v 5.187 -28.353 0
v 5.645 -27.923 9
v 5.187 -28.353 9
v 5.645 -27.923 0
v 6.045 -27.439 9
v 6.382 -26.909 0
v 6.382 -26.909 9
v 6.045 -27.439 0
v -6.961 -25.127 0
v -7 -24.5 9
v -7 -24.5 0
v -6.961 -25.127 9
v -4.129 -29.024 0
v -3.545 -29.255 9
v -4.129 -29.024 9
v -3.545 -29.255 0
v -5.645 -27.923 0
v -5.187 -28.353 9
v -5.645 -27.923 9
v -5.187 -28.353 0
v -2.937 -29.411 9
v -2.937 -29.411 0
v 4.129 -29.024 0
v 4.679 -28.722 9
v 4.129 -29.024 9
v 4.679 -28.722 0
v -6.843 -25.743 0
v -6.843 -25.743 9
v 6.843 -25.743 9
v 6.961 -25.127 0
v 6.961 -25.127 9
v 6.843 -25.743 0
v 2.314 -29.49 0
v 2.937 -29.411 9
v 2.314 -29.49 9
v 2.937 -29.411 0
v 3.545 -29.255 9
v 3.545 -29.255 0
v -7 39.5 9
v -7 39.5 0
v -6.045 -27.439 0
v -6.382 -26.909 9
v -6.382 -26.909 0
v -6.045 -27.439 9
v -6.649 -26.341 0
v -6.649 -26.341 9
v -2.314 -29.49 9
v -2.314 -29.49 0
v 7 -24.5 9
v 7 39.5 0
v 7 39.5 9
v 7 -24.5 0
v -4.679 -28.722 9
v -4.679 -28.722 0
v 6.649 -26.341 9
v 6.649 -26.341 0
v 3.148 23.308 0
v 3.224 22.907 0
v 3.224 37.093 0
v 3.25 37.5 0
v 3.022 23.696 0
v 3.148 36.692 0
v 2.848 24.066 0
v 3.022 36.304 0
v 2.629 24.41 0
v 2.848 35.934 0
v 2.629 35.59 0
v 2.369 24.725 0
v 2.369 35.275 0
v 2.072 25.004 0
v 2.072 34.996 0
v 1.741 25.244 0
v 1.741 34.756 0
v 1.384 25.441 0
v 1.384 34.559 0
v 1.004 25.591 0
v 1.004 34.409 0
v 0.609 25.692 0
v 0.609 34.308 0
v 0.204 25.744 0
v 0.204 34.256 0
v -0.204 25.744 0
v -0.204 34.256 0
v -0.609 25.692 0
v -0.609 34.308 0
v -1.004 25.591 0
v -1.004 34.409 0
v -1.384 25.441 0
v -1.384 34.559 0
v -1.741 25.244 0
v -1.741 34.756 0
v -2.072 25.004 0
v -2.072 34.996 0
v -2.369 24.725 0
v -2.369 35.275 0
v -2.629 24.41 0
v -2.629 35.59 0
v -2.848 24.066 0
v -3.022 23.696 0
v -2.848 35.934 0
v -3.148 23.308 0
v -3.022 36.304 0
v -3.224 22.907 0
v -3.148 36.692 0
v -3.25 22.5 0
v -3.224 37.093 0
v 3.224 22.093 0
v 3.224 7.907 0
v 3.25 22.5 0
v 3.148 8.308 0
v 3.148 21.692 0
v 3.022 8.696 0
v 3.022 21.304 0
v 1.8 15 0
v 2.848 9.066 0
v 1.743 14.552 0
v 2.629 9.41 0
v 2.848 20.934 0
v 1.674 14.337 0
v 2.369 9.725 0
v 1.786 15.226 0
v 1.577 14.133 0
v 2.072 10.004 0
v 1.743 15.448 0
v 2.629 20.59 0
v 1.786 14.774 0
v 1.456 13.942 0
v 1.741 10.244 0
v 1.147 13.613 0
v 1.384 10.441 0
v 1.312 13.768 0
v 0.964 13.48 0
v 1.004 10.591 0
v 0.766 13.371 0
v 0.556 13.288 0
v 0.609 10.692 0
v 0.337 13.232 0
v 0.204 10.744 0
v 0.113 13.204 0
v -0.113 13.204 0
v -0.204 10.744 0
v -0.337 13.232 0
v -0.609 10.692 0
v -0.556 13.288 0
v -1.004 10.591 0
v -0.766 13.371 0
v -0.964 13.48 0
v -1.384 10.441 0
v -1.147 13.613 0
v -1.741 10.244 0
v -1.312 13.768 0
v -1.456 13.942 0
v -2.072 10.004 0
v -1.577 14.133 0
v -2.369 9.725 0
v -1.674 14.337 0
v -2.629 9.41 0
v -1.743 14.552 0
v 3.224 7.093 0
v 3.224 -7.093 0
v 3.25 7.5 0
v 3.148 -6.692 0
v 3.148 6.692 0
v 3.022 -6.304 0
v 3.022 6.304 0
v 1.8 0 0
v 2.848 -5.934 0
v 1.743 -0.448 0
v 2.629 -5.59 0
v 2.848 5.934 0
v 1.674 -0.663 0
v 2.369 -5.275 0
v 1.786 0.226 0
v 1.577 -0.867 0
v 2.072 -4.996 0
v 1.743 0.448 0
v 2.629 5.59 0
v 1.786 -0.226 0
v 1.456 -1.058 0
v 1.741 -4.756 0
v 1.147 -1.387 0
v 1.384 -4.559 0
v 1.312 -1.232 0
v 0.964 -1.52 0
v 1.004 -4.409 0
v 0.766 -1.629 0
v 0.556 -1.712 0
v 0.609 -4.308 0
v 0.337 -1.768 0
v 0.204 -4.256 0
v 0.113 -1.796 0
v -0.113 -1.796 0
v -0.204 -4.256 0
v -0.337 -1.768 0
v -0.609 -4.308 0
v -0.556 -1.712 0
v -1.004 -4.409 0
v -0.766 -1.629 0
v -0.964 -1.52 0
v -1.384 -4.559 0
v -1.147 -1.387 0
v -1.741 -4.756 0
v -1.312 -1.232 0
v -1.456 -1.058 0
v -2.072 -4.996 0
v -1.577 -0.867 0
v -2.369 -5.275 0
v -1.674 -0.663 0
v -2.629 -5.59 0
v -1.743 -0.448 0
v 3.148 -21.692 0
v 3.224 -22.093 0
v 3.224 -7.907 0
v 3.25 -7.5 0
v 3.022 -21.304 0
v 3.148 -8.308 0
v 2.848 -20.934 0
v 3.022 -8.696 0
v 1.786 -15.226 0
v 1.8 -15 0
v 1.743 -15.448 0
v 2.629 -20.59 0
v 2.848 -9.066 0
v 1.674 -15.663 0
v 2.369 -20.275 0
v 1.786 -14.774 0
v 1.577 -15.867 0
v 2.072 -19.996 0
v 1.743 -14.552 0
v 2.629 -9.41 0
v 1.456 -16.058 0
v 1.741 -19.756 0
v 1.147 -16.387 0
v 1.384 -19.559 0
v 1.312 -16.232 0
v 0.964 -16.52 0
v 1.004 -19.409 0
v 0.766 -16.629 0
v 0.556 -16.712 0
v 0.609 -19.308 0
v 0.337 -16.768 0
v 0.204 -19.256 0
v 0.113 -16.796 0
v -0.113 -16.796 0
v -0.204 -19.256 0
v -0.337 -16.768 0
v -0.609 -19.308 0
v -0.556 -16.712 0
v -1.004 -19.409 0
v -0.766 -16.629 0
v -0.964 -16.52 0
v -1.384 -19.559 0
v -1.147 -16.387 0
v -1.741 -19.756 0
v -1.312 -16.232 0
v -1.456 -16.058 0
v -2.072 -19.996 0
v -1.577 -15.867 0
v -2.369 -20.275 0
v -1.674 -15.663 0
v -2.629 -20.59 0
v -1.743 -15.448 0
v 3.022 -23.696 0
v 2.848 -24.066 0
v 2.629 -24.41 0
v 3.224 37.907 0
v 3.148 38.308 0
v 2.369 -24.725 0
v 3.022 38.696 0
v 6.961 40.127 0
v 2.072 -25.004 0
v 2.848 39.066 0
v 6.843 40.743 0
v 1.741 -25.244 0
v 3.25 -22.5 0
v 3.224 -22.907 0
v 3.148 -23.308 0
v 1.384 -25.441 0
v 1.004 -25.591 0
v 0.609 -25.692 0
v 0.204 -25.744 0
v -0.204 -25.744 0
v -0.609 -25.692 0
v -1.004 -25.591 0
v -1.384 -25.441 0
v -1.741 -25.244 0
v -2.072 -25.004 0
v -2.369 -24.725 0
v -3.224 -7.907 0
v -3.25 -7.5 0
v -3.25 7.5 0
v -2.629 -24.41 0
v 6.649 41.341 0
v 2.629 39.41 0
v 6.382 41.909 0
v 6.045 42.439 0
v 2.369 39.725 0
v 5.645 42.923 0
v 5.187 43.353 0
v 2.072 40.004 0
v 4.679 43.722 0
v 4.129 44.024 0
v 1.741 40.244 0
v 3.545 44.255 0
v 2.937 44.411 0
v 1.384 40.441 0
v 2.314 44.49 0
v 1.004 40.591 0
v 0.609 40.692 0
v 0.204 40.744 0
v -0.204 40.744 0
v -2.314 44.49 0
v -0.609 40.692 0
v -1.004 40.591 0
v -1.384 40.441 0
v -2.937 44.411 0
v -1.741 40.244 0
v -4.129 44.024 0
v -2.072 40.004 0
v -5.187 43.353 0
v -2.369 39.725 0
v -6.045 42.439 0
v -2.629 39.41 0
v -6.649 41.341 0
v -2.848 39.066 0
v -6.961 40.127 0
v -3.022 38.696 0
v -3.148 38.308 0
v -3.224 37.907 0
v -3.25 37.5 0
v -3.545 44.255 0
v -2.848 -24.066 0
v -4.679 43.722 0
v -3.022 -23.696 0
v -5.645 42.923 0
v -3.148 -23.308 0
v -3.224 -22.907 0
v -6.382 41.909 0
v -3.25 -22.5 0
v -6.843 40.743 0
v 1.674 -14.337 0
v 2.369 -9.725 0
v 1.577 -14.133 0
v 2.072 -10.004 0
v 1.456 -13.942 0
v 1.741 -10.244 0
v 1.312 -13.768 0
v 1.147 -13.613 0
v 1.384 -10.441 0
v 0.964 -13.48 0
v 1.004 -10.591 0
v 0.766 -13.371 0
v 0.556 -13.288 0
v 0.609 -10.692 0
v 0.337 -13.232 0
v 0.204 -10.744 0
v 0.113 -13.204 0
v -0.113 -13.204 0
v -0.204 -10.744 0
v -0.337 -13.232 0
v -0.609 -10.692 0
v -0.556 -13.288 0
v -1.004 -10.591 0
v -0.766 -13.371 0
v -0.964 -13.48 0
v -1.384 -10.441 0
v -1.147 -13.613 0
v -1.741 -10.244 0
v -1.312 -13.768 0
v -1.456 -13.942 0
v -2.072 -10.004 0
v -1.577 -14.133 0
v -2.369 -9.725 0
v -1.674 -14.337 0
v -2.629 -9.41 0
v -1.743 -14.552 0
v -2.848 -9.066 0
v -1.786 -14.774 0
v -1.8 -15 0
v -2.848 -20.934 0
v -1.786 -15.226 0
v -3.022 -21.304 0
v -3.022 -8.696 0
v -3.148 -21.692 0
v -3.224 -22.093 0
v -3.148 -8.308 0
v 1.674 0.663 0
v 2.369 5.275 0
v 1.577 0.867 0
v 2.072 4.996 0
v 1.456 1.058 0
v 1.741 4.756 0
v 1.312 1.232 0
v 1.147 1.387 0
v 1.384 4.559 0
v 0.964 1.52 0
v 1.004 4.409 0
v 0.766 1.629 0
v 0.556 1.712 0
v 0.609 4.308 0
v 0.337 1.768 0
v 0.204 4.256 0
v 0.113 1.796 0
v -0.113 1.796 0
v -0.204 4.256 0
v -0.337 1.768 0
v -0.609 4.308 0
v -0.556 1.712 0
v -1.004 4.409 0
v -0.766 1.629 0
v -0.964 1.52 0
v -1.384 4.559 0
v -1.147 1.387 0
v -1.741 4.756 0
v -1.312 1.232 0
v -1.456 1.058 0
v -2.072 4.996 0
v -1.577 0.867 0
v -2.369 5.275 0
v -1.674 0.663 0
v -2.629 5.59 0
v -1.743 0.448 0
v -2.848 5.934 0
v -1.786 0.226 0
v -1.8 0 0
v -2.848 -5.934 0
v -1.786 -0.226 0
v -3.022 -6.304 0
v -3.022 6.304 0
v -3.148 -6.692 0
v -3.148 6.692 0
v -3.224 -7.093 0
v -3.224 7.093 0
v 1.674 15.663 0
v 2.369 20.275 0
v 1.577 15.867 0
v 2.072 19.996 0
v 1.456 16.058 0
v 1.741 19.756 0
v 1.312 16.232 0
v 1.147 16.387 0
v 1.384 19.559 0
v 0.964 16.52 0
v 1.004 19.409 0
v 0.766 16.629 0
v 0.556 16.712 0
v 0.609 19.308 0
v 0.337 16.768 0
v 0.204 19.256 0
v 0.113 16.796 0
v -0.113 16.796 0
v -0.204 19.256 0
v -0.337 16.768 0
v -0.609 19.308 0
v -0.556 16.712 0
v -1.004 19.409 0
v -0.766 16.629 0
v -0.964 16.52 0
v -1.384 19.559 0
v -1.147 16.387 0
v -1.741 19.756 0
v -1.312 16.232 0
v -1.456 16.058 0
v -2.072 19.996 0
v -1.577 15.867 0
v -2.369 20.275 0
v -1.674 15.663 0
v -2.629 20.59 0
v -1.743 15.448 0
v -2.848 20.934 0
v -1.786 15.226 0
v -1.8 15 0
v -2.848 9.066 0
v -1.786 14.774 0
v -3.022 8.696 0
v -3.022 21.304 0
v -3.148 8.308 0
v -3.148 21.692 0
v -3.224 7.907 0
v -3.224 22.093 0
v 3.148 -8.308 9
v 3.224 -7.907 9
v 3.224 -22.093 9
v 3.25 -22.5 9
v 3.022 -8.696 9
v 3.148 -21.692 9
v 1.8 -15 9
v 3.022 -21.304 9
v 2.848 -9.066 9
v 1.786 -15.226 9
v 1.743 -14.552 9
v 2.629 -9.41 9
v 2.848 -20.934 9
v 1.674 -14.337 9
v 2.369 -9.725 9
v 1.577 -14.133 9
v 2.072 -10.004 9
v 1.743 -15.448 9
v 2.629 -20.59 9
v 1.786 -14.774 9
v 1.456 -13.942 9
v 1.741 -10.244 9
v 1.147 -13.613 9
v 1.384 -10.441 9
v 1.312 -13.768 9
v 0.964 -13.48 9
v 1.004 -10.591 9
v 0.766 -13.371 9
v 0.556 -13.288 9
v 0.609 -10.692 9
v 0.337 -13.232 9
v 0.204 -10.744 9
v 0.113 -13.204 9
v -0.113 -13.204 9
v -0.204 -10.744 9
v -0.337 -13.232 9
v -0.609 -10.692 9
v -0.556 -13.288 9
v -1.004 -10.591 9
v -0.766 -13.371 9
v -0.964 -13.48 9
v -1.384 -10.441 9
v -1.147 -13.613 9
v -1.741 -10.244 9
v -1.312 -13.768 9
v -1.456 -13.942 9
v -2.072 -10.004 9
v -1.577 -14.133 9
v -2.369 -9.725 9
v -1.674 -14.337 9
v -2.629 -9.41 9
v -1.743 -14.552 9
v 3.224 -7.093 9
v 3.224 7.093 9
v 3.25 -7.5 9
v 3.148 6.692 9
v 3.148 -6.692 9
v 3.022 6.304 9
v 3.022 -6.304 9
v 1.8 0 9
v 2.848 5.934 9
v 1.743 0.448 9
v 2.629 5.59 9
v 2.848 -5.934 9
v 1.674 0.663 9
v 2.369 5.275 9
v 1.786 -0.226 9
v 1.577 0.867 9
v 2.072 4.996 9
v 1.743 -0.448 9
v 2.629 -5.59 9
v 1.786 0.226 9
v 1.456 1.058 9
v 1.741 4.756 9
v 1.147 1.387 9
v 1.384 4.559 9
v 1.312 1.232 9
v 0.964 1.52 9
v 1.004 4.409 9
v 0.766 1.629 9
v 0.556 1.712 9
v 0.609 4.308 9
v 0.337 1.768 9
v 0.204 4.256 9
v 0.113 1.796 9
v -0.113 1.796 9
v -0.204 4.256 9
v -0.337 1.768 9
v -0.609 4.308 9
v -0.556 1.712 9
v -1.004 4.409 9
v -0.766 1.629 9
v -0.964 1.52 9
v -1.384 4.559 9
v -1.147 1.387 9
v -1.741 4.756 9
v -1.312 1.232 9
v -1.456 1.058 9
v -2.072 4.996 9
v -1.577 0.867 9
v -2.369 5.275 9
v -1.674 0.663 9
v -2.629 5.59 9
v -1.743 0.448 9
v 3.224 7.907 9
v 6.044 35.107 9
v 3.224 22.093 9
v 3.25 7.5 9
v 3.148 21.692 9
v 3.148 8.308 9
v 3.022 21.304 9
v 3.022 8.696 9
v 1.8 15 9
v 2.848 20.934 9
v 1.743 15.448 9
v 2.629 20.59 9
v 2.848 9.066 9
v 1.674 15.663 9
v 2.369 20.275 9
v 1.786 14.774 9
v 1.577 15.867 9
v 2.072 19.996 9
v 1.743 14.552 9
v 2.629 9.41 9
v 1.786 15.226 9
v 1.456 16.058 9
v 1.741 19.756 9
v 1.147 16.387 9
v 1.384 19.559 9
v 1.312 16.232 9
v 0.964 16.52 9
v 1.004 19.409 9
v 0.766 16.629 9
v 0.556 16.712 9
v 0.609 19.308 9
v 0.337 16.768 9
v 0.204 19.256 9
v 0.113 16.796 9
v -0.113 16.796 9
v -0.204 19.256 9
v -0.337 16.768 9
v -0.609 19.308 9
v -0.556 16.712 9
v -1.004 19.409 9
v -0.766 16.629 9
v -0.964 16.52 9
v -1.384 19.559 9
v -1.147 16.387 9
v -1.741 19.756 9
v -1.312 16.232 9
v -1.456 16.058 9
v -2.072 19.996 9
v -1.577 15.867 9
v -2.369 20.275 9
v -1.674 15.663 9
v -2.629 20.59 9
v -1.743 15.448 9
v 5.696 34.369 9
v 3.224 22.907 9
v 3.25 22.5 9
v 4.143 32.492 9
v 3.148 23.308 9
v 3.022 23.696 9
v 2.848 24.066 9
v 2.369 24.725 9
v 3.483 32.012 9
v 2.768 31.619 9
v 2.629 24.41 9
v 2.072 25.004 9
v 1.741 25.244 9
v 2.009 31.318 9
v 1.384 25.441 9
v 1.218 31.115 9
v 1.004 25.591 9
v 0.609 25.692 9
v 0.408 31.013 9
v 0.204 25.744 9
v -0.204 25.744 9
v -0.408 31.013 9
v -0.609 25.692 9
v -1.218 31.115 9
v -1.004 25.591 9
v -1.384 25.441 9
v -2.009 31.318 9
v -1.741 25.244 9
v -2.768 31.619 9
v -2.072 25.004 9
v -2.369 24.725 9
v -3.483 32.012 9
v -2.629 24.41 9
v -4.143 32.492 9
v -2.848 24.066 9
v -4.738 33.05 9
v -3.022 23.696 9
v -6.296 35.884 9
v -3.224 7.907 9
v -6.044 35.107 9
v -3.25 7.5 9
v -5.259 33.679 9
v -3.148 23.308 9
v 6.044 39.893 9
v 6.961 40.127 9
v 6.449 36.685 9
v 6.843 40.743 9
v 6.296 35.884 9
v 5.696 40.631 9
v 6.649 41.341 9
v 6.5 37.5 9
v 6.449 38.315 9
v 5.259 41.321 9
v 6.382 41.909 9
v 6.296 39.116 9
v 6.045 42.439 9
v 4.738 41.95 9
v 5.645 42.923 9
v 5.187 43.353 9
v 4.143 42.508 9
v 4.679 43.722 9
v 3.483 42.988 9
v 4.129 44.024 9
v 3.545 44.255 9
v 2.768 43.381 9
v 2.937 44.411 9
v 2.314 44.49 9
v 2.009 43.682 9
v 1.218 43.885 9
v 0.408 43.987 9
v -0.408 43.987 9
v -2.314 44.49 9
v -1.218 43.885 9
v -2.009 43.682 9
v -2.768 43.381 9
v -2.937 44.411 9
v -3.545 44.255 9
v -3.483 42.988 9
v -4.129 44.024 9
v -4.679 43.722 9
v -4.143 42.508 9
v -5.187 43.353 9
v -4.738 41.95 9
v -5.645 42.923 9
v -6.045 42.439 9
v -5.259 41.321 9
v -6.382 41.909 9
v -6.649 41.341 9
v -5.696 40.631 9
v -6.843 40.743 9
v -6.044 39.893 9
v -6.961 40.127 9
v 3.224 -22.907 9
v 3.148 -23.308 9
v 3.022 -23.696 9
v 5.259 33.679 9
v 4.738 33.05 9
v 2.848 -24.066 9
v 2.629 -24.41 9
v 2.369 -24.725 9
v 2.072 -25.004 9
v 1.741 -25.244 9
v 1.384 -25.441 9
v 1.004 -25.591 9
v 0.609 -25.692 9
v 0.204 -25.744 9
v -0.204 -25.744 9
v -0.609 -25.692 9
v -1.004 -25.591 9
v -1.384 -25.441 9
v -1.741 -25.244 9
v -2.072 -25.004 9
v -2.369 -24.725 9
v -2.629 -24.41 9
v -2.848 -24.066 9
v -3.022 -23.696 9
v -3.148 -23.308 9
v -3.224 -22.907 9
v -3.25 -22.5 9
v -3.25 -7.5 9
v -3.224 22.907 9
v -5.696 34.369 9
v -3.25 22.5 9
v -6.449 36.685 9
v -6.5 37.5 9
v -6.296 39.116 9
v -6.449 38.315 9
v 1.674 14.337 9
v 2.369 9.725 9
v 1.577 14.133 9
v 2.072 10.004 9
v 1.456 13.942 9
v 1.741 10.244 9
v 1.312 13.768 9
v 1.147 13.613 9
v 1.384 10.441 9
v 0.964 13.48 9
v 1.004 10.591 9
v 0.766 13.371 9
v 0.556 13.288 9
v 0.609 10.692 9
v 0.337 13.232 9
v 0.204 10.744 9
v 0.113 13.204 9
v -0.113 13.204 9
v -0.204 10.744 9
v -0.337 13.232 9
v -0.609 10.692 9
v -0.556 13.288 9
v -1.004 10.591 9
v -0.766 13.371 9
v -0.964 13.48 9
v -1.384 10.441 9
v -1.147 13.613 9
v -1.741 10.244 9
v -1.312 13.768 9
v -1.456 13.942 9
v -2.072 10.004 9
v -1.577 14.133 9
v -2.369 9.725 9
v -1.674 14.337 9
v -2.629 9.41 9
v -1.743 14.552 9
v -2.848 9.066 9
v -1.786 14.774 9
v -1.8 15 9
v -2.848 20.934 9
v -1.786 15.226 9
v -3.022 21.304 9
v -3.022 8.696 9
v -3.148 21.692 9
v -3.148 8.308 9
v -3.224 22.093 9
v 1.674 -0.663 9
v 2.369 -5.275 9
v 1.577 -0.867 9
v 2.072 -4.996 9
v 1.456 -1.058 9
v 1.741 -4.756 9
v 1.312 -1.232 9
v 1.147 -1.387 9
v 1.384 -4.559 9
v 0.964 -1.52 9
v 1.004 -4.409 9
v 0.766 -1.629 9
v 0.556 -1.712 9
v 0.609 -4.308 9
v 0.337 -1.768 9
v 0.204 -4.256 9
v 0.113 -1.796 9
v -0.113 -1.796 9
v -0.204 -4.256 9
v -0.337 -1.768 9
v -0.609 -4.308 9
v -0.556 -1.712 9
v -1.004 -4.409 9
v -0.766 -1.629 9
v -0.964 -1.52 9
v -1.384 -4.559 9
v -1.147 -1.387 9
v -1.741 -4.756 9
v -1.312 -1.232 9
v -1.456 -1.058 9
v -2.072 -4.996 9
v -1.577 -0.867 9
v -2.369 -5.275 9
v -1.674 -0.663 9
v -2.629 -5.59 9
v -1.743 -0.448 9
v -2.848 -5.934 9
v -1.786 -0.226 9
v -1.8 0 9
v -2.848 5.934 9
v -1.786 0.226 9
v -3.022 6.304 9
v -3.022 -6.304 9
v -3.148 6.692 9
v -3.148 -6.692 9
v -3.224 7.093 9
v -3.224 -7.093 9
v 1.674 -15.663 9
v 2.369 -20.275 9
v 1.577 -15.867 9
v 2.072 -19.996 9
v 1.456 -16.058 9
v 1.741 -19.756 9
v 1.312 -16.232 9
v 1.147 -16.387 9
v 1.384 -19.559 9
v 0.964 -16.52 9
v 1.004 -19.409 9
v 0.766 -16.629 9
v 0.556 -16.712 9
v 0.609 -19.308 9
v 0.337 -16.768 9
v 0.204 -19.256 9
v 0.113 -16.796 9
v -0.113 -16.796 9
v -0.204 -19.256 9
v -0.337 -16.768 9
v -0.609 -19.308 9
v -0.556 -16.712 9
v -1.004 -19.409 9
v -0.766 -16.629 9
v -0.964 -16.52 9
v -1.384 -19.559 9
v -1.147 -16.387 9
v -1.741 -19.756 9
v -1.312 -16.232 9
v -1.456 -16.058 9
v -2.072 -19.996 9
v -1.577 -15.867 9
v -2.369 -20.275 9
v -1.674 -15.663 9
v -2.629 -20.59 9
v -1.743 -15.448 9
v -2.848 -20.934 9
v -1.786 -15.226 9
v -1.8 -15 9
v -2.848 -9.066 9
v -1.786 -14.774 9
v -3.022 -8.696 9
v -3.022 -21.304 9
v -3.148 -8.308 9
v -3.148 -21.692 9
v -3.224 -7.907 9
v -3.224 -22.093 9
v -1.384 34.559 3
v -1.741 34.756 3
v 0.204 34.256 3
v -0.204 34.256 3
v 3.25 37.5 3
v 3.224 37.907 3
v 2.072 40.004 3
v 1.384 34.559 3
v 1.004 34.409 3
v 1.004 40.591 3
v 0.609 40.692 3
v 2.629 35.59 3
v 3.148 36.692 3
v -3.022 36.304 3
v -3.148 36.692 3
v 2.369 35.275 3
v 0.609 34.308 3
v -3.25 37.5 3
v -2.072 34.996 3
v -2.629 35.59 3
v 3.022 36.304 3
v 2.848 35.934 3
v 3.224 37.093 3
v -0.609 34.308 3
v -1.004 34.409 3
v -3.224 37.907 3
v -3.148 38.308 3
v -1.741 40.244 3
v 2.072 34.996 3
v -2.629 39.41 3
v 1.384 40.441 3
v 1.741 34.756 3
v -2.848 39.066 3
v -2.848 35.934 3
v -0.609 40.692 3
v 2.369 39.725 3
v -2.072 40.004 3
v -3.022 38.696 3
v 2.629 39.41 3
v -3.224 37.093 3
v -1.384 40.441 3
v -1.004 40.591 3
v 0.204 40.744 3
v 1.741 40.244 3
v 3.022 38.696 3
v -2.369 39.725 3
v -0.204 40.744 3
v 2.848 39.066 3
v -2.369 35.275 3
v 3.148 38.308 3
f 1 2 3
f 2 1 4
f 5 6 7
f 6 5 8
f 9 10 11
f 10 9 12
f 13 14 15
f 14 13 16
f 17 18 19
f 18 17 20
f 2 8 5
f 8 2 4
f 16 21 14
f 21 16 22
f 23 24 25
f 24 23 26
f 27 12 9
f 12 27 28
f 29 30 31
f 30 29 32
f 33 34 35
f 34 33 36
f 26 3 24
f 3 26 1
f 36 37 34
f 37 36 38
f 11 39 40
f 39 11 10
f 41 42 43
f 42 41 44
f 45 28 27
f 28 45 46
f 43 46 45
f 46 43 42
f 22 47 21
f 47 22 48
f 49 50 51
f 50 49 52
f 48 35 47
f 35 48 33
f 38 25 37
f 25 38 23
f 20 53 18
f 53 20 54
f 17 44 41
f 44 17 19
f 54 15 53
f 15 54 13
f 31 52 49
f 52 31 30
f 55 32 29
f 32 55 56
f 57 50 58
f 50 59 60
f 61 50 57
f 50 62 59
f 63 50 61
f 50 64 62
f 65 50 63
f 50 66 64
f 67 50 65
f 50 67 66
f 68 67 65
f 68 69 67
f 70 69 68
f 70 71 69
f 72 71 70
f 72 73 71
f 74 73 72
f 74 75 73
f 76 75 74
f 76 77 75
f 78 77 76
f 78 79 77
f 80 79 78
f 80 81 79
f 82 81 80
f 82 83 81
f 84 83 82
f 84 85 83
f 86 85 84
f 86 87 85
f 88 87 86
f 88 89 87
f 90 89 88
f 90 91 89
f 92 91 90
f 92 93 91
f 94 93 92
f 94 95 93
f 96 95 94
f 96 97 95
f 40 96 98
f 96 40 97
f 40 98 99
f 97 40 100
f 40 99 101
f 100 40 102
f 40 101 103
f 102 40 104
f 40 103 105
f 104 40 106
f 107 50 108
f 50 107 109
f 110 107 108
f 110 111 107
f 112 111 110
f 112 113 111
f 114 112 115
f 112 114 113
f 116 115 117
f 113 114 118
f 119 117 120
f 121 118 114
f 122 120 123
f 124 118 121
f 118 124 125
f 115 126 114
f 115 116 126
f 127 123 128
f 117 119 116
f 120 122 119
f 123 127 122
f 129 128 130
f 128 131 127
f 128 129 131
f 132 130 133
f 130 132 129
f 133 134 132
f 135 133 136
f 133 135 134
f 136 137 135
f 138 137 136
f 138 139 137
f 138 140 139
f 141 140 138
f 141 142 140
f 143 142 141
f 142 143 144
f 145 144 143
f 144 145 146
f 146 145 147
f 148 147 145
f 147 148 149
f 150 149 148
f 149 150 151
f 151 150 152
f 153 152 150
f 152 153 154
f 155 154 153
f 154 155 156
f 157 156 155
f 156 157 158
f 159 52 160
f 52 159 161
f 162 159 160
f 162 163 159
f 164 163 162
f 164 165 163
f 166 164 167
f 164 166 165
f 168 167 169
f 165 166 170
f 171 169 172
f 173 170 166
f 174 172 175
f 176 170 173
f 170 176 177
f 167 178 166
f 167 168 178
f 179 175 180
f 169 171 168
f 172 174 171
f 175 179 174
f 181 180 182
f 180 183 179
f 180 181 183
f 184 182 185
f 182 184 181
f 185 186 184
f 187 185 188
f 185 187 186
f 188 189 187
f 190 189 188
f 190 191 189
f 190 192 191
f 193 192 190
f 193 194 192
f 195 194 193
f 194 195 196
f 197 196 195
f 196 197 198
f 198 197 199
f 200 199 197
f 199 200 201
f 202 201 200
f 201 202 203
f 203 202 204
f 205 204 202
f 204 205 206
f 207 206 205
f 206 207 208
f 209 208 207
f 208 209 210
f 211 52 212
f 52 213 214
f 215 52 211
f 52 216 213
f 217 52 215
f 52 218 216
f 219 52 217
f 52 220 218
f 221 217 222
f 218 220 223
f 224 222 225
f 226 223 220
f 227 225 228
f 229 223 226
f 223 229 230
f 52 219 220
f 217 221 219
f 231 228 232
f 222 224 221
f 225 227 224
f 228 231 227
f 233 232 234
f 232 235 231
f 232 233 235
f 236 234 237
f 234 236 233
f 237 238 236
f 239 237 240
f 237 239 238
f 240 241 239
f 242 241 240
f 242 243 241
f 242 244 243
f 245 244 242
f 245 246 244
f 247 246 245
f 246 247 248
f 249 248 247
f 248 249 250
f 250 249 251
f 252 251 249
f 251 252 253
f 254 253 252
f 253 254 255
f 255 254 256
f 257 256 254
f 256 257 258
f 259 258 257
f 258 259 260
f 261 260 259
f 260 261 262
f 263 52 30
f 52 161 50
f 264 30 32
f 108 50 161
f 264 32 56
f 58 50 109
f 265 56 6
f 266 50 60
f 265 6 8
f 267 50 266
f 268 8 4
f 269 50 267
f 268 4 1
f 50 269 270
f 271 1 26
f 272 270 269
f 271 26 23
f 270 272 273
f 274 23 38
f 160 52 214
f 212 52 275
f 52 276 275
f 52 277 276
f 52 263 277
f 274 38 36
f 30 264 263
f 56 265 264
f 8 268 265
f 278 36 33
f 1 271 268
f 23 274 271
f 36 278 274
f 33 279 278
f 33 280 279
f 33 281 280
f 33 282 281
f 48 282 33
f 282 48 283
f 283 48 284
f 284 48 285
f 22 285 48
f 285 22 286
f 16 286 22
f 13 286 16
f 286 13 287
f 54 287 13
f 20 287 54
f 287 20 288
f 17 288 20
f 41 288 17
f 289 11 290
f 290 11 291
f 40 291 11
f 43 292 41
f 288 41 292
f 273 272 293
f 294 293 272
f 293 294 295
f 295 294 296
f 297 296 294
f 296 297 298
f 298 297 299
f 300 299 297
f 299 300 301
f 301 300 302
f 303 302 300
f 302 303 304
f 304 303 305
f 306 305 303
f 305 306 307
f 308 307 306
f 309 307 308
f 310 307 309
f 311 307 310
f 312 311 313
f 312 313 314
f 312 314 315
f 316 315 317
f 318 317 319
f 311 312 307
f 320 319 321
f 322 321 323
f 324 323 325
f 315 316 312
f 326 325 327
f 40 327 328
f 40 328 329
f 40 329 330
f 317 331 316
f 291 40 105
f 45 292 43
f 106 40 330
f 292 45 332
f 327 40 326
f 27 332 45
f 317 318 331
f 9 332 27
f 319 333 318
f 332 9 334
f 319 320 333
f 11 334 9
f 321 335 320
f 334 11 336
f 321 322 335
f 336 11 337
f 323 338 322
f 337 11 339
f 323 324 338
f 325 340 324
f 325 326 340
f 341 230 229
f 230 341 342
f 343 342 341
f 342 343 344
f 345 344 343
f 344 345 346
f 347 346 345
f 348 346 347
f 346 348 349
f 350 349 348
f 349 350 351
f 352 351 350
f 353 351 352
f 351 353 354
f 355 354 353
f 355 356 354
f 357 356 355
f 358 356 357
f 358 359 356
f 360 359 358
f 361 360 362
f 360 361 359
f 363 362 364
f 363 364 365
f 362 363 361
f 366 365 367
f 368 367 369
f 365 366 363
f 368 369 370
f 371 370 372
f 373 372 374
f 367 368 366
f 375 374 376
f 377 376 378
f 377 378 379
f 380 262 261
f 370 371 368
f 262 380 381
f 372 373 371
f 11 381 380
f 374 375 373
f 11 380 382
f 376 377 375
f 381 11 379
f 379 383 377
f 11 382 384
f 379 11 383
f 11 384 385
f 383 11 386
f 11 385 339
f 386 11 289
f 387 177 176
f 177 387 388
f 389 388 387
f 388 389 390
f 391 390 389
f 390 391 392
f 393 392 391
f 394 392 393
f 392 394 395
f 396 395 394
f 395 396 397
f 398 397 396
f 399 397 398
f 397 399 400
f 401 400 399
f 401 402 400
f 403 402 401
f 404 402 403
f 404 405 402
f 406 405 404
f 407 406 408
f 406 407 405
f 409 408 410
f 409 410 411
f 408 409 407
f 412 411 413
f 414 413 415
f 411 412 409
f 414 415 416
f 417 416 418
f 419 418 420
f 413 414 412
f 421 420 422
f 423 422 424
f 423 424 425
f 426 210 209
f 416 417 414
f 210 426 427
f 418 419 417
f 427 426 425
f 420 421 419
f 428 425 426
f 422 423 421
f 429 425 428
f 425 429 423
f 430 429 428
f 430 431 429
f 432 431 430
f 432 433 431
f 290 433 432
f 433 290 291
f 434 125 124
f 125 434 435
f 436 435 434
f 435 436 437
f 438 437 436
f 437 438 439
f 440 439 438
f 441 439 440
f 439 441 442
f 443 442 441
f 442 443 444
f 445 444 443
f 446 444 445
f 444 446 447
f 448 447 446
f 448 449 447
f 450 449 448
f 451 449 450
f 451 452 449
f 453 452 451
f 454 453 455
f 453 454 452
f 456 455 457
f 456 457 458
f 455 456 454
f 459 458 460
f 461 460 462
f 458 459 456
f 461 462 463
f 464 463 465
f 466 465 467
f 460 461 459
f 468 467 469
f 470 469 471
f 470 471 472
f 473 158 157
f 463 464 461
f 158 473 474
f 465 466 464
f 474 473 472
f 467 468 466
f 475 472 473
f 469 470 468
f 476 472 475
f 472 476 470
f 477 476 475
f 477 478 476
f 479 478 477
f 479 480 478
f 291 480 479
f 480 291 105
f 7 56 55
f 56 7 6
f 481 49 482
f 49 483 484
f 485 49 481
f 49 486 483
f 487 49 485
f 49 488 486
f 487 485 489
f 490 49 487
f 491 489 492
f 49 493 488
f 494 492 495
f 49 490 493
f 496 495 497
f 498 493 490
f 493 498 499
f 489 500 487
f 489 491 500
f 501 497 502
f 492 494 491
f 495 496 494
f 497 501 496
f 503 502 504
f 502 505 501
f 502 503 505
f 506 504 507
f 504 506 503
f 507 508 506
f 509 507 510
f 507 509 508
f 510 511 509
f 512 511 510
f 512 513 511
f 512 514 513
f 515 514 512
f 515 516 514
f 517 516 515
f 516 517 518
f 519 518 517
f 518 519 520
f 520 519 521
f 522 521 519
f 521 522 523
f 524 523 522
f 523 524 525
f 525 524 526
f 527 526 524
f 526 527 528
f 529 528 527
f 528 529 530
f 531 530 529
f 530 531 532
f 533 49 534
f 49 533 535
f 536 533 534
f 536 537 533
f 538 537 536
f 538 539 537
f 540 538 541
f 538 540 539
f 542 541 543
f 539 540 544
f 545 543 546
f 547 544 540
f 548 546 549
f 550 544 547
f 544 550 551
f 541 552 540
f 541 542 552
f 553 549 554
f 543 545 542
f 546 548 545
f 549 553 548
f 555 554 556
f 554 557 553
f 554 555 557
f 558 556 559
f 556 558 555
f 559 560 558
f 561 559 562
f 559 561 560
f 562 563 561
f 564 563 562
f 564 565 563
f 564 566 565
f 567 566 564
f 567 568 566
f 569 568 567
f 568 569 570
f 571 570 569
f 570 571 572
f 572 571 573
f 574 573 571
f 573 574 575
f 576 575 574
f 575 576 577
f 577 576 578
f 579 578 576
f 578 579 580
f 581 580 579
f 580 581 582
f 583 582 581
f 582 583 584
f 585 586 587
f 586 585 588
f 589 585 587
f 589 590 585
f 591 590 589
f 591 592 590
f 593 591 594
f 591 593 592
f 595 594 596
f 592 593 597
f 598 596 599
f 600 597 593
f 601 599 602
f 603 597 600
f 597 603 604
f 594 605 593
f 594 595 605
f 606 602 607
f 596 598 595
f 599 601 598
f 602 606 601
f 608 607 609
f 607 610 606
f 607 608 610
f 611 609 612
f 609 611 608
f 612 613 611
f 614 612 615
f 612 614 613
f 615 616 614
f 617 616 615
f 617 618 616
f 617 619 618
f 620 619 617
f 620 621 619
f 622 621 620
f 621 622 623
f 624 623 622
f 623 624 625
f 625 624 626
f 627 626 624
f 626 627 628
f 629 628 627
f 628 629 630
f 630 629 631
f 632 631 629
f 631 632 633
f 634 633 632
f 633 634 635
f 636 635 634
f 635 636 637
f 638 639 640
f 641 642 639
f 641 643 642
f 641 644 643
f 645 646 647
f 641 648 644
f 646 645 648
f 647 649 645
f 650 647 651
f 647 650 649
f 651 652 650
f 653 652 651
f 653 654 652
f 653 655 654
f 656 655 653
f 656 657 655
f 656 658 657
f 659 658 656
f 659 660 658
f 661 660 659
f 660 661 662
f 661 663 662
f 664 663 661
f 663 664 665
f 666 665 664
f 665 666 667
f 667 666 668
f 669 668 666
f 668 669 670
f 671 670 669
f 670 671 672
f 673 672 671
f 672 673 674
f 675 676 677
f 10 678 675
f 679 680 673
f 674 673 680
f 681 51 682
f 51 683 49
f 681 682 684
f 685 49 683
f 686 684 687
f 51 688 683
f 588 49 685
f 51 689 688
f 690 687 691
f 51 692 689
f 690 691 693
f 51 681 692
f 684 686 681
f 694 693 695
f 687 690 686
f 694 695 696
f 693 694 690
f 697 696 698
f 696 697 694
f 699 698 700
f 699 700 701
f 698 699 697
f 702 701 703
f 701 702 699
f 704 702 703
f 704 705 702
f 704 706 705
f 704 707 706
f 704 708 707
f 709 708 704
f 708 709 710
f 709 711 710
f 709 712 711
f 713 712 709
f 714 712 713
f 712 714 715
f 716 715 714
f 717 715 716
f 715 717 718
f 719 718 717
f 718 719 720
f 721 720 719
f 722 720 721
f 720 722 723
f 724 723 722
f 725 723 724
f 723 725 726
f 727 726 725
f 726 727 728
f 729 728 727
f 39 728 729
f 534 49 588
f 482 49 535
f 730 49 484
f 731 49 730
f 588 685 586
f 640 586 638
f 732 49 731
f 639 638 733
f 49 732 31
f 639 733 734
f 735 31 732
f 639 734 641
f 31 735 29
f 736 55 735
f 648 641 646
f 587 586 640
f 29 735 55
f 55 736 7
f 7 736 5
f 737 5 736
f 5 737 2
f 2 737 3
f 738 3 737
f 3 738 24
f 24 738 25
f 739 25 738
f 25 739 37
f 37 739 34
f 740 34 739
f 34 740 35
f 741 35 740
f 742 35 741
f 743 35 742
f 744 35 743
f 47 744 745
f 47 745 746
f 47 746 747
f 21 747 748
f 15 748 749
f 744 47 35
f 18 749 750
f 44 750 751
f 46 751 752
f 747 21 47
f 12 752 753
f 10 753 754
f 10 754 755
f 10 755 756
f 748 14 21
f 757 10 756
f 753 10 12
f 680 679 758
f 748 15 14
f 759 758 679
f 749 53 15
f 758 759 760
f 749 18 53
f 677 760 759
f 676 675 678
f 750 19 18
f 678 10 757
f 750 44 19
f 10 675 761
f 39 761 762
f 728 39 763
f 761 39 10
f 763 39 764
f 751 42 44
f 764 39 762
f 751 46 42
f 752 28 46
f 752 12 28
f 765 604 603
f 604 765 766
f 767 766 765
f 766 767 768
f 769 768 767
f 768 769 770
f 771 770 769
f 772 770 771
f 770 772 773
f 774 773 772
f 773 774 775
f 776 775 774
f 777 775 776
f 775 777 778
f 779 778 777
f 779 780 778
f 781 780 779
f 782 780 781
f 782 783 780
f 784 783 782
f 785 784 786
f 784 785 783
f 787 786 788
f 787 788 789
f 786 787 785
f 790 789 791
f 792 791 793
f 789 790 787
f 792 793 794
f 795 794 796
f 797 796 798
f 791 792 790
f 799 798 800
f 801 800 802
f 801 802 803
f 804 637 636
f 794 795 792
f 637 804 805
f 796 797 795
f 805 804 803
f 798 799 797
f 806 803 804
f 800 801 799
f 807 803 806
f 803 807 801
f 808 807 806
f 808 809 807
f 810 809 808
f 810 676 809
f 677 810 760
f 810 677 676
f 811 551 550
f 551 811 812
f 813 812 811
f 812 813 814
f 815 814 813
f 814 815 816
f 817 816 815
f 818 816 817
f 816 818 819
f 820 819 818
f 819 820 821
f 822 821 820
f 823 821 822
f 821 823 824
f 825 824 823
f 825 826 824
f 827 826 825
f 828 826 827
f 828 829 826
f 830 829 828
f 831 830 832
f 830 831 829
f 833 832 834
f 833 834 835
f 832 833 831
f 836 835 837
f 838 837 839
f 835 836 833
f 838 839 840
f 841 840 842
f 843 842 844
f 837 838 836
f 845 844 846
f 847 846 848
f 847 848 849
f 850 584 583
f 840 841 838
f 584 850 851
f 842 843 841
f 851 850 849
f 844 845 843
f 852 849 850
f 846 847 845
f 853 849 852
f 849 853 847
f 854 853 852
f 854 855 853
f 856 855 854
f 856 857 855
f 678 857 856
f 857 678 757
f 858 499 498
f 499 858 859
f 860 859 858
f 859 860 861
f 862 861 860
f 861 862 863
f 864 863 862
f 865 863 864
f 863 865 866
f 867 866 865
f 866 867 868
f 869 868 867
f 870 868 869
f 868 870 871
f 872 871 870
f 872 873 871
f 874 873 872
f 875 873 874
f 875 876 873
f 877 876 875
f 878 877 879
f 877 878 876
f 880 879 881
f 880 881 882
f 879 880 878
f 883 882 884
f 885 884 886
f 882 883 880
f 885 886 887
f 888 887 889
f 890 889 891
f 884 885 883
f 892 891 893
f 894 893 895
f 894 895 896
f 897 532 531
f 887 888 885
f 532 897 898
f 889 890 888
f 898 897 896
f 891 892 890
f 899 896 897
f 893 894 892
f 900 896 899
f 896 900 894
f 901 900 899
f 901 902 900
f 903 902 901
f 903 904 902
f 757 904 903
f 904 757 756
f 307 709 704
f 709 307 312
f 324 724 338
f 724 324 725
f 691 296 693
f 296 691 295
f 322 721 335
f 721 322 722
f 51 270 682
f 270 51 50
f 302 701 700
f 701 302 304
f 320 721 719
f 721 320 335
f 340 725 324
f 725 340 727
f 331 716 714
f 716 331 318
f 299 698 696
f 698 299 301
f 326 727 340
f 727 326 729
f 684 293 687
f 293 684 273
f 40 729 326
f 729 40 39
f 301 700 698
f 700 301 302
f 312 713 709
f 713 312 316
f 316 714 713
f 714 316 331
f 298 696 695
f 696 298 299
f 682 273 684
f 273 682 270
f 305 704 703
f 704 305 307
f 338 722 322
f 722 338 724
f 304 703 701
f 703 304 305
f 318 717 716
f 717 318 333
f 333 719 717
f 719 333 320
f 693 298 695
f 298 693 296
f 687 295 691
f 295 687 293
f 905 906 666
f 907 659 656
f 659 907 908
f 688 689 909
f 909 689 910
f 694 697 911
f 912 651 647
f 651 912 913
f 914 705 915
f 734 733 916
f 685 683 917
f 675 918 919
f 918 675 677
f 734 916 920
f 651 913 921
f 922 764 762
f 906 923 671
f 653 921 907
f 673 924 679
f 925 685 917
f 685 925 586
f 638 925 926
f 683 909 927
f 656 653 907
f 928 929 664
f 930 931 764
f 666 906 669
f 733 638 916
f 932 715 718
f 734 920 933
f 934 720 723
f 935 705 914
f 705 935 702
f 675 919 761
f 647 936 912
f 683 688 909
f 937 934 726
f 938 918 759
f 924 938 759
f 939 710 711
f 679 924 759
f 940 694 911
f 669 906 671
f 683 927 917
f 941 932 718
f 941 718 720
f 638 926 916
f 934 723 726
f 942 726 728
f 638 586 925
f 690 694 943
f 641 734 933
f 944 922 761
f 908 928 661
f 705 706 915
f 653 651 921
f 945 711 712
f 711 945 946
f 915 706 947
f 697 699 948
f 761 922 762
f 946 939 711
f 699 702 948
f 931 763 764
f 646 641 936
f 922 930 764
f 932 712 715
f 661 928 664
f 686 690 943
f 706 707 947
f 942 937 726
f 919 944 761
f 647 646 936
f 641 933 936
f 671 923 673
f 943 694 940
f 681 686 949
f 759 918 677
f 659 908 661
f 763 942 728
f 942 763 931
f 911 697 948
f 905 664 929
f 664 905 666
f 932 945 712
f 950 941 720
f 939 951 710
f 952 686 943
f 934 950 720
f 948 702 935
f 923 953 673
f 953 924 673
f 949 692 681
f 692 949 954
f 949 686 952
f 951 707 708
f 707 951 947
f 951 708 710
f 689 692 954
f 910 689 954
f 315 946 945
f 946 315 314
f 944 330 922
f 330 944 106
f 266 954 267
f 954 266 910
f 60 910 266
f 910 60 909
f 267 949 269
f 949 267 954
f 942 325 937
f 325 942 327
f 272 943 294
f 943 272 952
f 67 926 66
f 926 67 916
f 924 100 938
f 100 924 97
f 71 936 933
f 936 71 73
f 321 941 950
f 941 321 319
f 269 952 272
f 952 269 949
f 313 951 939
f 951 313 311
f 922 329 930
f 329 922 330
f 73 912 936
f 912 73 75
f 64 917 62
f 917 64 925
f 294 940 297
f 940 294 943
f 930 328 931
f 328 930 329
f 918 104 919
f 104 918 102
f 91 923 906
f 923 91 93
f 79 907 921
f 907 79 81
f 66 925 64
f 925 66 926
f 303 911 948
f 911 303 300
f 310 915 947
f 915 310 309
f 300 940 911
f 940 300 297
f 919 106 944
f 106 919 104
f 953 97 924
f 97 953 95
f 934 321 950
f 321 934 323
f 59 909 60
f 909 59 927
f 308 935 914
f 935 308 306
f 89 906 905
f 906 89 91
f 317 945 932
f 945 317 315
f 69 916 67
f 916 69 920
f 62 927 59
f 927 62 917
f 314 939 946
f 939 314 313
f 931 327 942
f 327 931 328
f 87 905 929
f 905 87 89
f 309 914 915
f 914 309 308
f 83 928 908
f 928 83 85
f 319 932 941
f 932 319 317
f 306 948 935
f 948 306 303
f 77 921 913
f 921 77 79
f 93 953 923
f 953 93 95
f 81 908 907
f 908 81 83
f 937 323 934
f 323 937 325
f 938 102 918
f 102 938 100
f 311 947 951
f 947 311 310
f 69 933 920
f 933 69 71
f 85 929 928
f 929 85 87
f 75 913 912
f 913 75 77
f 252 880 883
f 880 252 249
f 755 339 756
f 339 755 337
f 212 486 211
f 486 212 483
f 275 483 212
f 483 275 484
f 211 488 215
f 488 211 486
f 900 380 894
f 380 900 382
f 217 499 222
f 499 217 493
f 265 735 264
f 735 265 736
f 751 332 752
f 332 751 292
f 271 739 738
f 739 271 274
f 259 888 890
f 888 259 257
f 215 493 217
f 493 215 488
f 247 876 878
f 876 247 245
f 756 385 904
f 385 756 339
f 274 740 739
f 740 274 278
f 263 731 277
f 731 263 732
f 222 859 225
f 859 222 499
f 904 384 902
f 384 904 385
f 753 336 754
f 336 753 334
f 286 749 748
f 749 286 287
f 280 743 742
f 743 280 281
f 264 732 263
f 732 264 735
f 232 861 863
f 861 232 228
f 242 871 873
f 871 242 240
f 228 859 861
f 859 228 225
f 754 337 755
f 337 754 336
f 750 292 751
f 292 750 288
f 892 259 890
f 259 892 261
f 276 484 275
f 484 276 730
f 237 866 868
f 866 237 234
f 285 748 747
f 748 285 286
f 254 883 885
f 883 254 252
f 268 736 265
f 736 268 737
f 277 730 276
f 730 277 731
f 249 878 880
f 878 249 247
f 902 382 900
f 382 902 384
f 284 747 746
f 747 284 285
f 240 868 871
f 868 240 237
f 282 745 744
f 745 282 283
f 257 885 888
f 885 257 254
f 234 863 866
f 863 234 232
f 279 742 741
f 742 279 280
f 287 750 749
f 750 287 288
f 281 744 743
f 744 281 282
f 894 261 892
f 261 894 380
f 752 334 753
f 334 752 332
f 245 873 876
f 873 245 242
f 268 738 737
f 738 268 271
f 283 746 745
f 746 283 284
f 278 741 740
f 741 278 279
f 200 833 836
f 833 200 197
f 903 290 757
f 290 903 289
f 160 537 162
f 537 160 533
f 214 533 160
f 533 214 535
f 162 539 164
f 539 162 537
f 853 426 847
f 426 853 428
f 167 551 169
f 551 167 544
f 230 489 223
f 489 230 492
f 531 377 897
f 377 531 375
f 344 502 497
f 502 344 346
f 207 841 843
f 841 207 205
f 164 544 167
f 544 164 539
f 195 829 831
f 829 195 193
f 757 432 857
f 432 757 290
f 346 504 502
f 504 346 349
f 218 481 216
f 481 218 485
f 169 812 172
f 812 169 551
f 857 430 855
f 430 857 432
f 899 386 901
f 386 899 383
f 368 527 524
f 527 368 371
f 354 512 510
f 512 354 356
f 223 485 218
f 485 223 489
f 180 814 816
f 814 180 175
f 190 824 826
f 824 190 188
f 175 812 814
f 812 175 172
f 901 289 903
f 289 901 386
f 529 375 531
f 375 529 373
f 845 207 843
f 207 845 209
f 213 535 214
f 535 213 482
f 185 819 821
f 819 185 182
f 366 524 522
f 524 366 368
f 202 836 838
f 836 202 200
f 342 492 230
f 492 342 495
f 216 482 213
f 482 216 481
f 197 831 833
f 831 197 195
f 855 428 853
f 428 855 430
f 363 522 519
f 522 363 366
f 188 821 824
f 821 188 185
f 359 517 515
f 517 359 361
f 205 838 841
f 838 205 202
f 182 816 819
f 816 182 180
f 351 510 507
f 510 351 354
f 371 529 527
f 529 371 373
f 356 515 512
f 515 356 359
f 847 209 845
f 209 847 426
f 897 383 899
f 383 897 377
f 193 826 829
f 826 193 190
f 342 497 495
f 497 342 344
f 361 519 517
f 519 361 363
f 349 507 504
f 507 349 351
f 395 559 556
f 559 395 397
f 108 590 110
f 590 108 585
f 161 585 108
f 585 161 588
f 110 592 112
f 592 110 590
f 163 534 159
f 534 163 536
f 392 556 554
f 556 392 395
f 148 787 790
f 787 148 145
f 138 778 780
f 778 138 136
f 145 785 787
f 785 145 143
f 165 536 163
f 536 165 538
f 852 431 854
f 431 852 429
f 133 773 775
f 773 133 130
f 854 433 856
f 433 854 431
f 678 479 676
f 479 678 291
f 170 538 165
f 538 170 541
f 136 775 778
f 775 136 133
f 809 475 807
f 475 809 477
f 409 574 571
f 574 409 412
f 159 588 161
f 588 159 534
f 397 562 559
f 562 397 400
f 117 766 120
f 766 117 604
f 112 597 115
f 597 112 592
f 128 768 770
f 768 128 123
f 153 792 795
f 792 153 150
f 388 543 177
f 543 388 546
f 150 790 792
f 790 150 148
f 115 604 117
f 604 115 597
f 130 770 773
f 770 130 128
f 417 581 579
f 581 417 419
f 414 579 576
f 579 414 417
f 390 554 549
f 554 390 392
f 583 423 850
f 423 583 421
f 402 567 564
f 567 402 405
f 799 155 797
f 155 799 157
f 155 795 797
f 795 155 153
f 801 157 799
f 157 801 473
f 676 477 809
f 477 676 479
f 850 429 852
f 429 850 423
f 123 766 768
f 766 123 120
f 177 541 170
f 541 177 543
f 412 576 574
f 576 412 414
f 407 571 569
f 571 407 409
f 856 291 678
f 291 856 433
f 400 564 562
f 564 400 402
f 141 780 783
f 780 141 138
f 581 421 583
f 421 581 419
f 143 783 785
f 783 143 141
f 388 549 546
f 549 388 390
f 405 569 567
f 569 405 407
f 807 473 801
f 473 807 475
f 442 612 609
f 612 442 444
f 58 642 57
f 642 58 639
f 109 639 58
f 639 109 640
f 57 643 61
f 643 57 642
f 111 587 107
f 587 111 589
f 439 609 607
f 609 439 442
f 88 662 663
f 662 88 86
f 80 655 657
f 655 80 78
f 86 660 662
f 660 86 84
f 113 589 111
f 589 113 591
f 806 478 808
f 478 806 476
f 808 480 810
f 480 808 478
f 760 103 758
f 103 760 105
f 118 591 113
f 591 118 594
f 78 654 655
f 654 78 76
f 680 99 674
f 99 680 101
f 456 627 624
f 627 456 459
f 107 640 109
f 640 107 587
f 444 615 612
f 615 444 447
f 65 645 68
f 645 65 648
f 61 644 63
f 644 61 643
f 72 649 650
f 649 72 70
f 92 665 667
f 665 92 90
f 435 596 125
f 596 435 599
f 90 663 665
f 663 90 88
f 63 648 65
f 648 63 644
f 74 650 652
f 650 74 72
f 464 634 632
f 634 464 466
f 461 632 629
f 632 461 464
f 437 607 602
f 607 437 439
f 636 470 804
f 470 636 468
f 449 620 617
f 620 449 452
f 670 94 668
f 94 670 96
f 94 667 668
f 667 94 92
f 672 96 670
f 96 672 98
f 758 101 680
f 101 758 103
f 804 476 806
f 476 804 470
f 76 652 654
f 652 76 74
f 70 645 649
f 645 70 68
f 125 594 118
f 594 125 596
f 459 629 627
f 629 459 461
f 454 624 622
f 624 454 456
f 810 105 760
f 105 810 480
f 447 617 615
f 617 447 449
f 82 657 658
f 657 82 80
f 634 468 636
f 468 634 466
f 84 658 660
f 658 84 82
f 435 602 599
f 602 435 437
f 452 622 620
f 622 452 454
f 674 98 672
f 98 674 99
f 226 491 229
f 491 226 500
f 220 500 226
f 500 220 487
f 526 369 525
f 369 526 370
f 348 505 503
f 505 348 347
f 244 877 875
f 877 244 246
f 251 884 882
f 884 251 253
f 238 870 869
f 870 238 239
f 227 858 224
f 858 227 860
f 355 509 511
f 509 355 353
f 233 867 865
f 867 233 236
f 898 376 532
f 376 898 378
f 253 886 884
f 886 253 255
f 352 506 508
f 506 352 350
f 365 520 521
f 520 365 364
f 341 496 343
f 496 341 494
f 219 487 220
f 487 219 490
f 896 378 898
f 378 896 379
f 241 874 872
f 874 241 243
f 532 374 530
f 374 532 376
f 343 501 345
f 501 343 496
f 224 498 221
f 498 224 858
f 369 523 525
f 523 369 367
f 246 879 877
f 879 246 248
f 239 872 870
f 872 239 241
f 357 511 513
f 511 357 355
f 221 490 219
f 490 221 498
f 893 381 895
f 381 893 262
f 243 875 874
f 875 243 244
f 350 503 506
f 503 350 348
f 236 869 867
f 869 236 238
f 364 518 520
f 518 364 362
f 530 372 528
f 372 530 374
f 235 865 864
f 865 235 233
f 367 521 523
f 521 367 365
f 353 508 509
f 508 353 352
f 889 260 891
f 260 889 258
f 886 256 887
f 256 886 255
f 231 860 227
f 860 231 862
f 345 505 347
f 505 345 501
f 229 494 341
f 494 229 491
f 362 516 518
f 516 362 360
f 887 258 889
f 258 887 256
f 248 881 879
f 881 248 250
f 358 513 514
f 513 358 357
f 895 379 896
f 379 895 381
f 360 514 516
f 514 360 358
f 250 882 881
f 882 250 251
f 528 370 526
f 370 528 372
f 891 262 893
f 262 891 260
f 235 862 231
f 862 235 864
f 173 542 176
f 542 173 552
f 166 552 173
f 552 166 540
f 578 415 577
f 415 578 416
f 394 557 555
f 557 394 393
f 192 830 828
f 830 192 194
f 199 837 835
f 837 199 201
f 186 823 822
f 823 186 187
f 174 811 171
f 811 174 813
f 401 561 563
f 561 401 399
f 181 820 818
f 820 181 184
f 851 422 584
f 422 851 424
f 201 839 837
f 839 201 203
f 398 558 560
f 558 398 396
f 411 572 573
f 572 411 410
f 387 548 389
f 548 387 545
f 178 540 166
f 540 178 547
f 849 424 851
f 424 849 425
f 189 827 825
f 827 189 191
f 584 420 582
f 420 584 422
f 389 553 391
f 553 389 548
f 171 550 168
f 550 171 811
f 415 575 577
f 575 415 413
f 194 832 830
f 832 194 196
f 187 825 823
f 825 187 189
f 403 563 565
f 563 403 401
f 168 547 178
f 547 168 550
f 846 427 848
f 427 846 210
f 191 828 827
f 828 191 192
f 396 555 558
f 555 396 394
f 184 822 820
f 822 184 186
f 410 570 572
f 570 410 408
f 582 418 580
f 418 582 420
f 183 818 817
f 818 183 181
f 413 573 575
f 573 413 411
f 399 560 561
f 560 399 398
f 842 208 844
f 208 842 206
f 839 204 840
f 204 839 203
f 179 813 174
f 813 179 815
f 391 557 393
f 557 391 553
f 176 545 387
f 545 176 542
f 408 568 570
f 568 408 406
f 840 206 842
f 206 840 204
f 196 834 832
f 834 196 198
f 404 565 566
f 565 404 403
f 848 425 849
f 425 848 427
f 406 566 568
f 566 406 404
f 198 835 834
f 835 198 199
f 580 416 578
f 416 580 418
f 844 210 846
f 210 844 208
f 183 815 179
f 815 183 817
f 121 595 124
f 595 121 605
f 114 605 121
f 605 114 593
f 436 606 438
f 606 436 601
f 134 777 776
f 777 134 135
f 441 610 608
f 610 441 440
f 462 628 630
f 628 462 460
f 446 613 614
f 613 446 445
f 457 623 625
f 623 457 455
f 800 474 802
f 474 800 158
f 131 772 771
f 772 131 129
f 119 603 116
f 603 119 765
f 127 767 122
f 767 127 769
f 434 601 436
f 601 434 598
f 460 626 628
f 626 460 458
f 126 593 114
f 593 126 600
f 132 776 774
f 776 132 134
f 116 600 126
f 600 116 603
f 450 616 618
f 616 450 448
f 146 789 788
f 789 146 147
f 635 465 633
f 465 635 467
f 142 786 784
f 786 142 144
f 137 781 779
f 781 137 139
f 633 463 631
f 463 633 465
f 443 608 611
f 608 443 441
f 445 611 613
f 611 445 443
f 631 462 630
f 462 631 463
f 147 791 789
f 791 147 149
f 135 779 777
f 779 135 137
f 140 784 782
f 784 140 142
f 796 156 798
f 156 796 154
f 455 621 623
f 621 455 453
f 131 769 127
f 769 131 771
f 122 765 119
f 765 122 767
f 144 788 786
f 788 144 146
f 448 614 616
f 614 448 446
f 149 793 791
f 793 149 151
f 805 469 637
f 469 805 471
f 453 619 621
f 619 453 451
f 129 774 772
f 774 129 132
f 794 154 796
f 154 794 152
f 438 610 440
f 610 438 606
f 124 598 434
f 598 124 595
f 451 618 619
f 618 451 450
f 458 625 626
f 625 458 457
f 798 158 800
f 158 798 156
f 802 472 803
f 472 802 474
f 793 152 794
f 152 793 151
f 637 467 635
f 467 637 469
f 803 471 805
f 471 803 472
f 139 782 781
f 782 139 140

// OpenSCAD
$fn = 50;


difference() {
	union() {
		hull() {
			translate(v = [-2.0000000000, 24.5000000000, 0]) {
				cylinder(h = 9, r = 5);
			}
			translate(v = [2.0000000000, 24.5000000000, 0]) {
				cylinder(h = 9, r = 5);
			}
			translate(v = [-2.0000000000, -24.5000000000, 0]) {
				cylinder(h = 9, r = 5);
			}
			translate(v = [2.0000000000, -24.5000000000, 0]) {
				cylinder(h = 9, r = 5);
			}
		}
		translate(v = [0.0000000000, 30.0000000000, 0]) {
			hull() {
				translate(v = [-2.0000000000, 9.5000000000, 0]) {
					cylinder(h = 9, r = 5);
				}
				translate(v = [2.0000000000, 9.5000000000, 0]) {
					cylinder(h = 9, r = 5);
				}
				translate(v = [-2.0000000000, -9.5000000000, 0]) {
					cylinder(h = 9, r = 5);
				}
				translate(v = [2.0000000000, -9.5000000000, 0]) {
					cylinder(h = 9, r = 5);
				}
			}
		}
		translate(v = [0.0000000000, 30.0000000000, 0]) {
			hull() {
				translate(v = [-2.0000000000, 9.5000000000, 0]) {
					cylinder(h = 9, r = 5);
				}
				translate(v = [2.0000000000, 9.5000000000, 0]) {
					cylinder(h = 9, r = 5);
				}
				translate(v = [-2.0000000000, -9.5000000000, 0]) {
					cylinder(h = 9, r = 5);
				}
				translate(v = [2.0000000000, -9.5000000000, 0]) {
					cylinder(h = 9, r = 5);
				}
			}
		}
	}
	union() {
		translate(v = [0.0000000000, 37.5000000000, 9]) {
			rotate(a = [0, 0, 0]) {
				difference() {
					union() {
						#translate(v = [0, 0, -9.0000000000]) {
							cylinder(h = 9, r = 2.2500000000);
						}
						#translate(v = [0, 0, -6]) {
							cylinder(h = 6, r1 = 3.2500000000, r2 = 6.5000000000);
						}
						#translate(v = [0, 0, -9.0000000000]) {
							cylinder(h = 9, r = 3.2500000000);
						}
						#translate(v = [0, 0, -9.0000000000]) {
							cylinder(h = 9, r = 2.2500000000);
						}
					}
					union();
				}
			}
		}
		translate(v = [0.0000000000, 37.5000000000, 9]) {
			rotate(a = [0, 0, 0]) {
				difference() {
					union() {
						#translate(v = [0, 0, -9.0000000000]) {
							cylinder(h = 9, r = 2.2500000000);
						}
						#translate(v = [0, 0, -6]) {
							cylinder(h = 6, r1 = 3.2500000000, r2 = 6.5000000000);
						}
						#translate(v = [0, 0, -9.0000000000]) {
							cylinder(h = 9, r = 3.2500000000);
						}
						#translate(v = [0, 0, -9.0000000000]) {
							cylinder(h = 9, r = 2.2500000000);
						}
					}
					union();
				}
			}
		}
		translate(v = [0.0000000000, -22.5000000000, 0]) {
			translate(v = [0, 0, -100]) {
				cylinder(h = 200, r = 3.2500000000);
			}
		}
		translate(v = [0.0000000000, -7.5000000000, 0]) {
			translate(v = [0, 0, -100]) {
				cylinder(h = 200, r = 3.2500000000);
			}
		}
		translate(v = [0.0000000000, 7.5000000000, 0]) {
			translate(v = [0, 0, -100]) {
				cylinder(h = 200, r = 3.2500000000);
			}
		}
		translate(v = [0.0000000000, 22.5000000000, 0]) {
			translate(v = [0, 0, -100]) {
				cylinder(h = 200, r = 3.2500000000);
			}
		}
		translate(v = [0.0000000000, -22.5000000000, 0]) {
			translate(v = [0, 0, -100]) {
				cylinder(h = 200, r = 1.8000000000);
			}
		}
		translate(v = [0.0000000000, -15.0000000000, 0]) {
			translate(v = [0, 0, -100]) {
				cylinder(h = 200, r = 1.8000000000);
			}
		}
		translate(v = [0.0000000000, -7.5000000000, 0]) {
			translate(v = [0, 0, -100]) {
				cylinder(h = 200, r = 1.8000000000);
			}
		}
		translate(v = [0, 0, -100]) {
			cylinder(h = 200, r = 1.8000000000);
		}
		translate(v = [0.0000000000, 7.5000000000, 0]) {
			translate(v = [0, 0, -100]) {
				cylinder(h = 200, r = 1.8000000000);
			}
		}
		translate(v = [0.0000000000, 15.0000000000, 0]) {
			translate(v = [0, 0, -100]) {
				cylinder(h = 200, r = 1.8000000000);
			}
		}
		translate(v = [0.0000000000, 22.5000000000, 0]) {
			translate(v = [0, 0, -100]) {
				cylinder(h = 200, r = 1.8000000000);
			}
		}
	}
}
